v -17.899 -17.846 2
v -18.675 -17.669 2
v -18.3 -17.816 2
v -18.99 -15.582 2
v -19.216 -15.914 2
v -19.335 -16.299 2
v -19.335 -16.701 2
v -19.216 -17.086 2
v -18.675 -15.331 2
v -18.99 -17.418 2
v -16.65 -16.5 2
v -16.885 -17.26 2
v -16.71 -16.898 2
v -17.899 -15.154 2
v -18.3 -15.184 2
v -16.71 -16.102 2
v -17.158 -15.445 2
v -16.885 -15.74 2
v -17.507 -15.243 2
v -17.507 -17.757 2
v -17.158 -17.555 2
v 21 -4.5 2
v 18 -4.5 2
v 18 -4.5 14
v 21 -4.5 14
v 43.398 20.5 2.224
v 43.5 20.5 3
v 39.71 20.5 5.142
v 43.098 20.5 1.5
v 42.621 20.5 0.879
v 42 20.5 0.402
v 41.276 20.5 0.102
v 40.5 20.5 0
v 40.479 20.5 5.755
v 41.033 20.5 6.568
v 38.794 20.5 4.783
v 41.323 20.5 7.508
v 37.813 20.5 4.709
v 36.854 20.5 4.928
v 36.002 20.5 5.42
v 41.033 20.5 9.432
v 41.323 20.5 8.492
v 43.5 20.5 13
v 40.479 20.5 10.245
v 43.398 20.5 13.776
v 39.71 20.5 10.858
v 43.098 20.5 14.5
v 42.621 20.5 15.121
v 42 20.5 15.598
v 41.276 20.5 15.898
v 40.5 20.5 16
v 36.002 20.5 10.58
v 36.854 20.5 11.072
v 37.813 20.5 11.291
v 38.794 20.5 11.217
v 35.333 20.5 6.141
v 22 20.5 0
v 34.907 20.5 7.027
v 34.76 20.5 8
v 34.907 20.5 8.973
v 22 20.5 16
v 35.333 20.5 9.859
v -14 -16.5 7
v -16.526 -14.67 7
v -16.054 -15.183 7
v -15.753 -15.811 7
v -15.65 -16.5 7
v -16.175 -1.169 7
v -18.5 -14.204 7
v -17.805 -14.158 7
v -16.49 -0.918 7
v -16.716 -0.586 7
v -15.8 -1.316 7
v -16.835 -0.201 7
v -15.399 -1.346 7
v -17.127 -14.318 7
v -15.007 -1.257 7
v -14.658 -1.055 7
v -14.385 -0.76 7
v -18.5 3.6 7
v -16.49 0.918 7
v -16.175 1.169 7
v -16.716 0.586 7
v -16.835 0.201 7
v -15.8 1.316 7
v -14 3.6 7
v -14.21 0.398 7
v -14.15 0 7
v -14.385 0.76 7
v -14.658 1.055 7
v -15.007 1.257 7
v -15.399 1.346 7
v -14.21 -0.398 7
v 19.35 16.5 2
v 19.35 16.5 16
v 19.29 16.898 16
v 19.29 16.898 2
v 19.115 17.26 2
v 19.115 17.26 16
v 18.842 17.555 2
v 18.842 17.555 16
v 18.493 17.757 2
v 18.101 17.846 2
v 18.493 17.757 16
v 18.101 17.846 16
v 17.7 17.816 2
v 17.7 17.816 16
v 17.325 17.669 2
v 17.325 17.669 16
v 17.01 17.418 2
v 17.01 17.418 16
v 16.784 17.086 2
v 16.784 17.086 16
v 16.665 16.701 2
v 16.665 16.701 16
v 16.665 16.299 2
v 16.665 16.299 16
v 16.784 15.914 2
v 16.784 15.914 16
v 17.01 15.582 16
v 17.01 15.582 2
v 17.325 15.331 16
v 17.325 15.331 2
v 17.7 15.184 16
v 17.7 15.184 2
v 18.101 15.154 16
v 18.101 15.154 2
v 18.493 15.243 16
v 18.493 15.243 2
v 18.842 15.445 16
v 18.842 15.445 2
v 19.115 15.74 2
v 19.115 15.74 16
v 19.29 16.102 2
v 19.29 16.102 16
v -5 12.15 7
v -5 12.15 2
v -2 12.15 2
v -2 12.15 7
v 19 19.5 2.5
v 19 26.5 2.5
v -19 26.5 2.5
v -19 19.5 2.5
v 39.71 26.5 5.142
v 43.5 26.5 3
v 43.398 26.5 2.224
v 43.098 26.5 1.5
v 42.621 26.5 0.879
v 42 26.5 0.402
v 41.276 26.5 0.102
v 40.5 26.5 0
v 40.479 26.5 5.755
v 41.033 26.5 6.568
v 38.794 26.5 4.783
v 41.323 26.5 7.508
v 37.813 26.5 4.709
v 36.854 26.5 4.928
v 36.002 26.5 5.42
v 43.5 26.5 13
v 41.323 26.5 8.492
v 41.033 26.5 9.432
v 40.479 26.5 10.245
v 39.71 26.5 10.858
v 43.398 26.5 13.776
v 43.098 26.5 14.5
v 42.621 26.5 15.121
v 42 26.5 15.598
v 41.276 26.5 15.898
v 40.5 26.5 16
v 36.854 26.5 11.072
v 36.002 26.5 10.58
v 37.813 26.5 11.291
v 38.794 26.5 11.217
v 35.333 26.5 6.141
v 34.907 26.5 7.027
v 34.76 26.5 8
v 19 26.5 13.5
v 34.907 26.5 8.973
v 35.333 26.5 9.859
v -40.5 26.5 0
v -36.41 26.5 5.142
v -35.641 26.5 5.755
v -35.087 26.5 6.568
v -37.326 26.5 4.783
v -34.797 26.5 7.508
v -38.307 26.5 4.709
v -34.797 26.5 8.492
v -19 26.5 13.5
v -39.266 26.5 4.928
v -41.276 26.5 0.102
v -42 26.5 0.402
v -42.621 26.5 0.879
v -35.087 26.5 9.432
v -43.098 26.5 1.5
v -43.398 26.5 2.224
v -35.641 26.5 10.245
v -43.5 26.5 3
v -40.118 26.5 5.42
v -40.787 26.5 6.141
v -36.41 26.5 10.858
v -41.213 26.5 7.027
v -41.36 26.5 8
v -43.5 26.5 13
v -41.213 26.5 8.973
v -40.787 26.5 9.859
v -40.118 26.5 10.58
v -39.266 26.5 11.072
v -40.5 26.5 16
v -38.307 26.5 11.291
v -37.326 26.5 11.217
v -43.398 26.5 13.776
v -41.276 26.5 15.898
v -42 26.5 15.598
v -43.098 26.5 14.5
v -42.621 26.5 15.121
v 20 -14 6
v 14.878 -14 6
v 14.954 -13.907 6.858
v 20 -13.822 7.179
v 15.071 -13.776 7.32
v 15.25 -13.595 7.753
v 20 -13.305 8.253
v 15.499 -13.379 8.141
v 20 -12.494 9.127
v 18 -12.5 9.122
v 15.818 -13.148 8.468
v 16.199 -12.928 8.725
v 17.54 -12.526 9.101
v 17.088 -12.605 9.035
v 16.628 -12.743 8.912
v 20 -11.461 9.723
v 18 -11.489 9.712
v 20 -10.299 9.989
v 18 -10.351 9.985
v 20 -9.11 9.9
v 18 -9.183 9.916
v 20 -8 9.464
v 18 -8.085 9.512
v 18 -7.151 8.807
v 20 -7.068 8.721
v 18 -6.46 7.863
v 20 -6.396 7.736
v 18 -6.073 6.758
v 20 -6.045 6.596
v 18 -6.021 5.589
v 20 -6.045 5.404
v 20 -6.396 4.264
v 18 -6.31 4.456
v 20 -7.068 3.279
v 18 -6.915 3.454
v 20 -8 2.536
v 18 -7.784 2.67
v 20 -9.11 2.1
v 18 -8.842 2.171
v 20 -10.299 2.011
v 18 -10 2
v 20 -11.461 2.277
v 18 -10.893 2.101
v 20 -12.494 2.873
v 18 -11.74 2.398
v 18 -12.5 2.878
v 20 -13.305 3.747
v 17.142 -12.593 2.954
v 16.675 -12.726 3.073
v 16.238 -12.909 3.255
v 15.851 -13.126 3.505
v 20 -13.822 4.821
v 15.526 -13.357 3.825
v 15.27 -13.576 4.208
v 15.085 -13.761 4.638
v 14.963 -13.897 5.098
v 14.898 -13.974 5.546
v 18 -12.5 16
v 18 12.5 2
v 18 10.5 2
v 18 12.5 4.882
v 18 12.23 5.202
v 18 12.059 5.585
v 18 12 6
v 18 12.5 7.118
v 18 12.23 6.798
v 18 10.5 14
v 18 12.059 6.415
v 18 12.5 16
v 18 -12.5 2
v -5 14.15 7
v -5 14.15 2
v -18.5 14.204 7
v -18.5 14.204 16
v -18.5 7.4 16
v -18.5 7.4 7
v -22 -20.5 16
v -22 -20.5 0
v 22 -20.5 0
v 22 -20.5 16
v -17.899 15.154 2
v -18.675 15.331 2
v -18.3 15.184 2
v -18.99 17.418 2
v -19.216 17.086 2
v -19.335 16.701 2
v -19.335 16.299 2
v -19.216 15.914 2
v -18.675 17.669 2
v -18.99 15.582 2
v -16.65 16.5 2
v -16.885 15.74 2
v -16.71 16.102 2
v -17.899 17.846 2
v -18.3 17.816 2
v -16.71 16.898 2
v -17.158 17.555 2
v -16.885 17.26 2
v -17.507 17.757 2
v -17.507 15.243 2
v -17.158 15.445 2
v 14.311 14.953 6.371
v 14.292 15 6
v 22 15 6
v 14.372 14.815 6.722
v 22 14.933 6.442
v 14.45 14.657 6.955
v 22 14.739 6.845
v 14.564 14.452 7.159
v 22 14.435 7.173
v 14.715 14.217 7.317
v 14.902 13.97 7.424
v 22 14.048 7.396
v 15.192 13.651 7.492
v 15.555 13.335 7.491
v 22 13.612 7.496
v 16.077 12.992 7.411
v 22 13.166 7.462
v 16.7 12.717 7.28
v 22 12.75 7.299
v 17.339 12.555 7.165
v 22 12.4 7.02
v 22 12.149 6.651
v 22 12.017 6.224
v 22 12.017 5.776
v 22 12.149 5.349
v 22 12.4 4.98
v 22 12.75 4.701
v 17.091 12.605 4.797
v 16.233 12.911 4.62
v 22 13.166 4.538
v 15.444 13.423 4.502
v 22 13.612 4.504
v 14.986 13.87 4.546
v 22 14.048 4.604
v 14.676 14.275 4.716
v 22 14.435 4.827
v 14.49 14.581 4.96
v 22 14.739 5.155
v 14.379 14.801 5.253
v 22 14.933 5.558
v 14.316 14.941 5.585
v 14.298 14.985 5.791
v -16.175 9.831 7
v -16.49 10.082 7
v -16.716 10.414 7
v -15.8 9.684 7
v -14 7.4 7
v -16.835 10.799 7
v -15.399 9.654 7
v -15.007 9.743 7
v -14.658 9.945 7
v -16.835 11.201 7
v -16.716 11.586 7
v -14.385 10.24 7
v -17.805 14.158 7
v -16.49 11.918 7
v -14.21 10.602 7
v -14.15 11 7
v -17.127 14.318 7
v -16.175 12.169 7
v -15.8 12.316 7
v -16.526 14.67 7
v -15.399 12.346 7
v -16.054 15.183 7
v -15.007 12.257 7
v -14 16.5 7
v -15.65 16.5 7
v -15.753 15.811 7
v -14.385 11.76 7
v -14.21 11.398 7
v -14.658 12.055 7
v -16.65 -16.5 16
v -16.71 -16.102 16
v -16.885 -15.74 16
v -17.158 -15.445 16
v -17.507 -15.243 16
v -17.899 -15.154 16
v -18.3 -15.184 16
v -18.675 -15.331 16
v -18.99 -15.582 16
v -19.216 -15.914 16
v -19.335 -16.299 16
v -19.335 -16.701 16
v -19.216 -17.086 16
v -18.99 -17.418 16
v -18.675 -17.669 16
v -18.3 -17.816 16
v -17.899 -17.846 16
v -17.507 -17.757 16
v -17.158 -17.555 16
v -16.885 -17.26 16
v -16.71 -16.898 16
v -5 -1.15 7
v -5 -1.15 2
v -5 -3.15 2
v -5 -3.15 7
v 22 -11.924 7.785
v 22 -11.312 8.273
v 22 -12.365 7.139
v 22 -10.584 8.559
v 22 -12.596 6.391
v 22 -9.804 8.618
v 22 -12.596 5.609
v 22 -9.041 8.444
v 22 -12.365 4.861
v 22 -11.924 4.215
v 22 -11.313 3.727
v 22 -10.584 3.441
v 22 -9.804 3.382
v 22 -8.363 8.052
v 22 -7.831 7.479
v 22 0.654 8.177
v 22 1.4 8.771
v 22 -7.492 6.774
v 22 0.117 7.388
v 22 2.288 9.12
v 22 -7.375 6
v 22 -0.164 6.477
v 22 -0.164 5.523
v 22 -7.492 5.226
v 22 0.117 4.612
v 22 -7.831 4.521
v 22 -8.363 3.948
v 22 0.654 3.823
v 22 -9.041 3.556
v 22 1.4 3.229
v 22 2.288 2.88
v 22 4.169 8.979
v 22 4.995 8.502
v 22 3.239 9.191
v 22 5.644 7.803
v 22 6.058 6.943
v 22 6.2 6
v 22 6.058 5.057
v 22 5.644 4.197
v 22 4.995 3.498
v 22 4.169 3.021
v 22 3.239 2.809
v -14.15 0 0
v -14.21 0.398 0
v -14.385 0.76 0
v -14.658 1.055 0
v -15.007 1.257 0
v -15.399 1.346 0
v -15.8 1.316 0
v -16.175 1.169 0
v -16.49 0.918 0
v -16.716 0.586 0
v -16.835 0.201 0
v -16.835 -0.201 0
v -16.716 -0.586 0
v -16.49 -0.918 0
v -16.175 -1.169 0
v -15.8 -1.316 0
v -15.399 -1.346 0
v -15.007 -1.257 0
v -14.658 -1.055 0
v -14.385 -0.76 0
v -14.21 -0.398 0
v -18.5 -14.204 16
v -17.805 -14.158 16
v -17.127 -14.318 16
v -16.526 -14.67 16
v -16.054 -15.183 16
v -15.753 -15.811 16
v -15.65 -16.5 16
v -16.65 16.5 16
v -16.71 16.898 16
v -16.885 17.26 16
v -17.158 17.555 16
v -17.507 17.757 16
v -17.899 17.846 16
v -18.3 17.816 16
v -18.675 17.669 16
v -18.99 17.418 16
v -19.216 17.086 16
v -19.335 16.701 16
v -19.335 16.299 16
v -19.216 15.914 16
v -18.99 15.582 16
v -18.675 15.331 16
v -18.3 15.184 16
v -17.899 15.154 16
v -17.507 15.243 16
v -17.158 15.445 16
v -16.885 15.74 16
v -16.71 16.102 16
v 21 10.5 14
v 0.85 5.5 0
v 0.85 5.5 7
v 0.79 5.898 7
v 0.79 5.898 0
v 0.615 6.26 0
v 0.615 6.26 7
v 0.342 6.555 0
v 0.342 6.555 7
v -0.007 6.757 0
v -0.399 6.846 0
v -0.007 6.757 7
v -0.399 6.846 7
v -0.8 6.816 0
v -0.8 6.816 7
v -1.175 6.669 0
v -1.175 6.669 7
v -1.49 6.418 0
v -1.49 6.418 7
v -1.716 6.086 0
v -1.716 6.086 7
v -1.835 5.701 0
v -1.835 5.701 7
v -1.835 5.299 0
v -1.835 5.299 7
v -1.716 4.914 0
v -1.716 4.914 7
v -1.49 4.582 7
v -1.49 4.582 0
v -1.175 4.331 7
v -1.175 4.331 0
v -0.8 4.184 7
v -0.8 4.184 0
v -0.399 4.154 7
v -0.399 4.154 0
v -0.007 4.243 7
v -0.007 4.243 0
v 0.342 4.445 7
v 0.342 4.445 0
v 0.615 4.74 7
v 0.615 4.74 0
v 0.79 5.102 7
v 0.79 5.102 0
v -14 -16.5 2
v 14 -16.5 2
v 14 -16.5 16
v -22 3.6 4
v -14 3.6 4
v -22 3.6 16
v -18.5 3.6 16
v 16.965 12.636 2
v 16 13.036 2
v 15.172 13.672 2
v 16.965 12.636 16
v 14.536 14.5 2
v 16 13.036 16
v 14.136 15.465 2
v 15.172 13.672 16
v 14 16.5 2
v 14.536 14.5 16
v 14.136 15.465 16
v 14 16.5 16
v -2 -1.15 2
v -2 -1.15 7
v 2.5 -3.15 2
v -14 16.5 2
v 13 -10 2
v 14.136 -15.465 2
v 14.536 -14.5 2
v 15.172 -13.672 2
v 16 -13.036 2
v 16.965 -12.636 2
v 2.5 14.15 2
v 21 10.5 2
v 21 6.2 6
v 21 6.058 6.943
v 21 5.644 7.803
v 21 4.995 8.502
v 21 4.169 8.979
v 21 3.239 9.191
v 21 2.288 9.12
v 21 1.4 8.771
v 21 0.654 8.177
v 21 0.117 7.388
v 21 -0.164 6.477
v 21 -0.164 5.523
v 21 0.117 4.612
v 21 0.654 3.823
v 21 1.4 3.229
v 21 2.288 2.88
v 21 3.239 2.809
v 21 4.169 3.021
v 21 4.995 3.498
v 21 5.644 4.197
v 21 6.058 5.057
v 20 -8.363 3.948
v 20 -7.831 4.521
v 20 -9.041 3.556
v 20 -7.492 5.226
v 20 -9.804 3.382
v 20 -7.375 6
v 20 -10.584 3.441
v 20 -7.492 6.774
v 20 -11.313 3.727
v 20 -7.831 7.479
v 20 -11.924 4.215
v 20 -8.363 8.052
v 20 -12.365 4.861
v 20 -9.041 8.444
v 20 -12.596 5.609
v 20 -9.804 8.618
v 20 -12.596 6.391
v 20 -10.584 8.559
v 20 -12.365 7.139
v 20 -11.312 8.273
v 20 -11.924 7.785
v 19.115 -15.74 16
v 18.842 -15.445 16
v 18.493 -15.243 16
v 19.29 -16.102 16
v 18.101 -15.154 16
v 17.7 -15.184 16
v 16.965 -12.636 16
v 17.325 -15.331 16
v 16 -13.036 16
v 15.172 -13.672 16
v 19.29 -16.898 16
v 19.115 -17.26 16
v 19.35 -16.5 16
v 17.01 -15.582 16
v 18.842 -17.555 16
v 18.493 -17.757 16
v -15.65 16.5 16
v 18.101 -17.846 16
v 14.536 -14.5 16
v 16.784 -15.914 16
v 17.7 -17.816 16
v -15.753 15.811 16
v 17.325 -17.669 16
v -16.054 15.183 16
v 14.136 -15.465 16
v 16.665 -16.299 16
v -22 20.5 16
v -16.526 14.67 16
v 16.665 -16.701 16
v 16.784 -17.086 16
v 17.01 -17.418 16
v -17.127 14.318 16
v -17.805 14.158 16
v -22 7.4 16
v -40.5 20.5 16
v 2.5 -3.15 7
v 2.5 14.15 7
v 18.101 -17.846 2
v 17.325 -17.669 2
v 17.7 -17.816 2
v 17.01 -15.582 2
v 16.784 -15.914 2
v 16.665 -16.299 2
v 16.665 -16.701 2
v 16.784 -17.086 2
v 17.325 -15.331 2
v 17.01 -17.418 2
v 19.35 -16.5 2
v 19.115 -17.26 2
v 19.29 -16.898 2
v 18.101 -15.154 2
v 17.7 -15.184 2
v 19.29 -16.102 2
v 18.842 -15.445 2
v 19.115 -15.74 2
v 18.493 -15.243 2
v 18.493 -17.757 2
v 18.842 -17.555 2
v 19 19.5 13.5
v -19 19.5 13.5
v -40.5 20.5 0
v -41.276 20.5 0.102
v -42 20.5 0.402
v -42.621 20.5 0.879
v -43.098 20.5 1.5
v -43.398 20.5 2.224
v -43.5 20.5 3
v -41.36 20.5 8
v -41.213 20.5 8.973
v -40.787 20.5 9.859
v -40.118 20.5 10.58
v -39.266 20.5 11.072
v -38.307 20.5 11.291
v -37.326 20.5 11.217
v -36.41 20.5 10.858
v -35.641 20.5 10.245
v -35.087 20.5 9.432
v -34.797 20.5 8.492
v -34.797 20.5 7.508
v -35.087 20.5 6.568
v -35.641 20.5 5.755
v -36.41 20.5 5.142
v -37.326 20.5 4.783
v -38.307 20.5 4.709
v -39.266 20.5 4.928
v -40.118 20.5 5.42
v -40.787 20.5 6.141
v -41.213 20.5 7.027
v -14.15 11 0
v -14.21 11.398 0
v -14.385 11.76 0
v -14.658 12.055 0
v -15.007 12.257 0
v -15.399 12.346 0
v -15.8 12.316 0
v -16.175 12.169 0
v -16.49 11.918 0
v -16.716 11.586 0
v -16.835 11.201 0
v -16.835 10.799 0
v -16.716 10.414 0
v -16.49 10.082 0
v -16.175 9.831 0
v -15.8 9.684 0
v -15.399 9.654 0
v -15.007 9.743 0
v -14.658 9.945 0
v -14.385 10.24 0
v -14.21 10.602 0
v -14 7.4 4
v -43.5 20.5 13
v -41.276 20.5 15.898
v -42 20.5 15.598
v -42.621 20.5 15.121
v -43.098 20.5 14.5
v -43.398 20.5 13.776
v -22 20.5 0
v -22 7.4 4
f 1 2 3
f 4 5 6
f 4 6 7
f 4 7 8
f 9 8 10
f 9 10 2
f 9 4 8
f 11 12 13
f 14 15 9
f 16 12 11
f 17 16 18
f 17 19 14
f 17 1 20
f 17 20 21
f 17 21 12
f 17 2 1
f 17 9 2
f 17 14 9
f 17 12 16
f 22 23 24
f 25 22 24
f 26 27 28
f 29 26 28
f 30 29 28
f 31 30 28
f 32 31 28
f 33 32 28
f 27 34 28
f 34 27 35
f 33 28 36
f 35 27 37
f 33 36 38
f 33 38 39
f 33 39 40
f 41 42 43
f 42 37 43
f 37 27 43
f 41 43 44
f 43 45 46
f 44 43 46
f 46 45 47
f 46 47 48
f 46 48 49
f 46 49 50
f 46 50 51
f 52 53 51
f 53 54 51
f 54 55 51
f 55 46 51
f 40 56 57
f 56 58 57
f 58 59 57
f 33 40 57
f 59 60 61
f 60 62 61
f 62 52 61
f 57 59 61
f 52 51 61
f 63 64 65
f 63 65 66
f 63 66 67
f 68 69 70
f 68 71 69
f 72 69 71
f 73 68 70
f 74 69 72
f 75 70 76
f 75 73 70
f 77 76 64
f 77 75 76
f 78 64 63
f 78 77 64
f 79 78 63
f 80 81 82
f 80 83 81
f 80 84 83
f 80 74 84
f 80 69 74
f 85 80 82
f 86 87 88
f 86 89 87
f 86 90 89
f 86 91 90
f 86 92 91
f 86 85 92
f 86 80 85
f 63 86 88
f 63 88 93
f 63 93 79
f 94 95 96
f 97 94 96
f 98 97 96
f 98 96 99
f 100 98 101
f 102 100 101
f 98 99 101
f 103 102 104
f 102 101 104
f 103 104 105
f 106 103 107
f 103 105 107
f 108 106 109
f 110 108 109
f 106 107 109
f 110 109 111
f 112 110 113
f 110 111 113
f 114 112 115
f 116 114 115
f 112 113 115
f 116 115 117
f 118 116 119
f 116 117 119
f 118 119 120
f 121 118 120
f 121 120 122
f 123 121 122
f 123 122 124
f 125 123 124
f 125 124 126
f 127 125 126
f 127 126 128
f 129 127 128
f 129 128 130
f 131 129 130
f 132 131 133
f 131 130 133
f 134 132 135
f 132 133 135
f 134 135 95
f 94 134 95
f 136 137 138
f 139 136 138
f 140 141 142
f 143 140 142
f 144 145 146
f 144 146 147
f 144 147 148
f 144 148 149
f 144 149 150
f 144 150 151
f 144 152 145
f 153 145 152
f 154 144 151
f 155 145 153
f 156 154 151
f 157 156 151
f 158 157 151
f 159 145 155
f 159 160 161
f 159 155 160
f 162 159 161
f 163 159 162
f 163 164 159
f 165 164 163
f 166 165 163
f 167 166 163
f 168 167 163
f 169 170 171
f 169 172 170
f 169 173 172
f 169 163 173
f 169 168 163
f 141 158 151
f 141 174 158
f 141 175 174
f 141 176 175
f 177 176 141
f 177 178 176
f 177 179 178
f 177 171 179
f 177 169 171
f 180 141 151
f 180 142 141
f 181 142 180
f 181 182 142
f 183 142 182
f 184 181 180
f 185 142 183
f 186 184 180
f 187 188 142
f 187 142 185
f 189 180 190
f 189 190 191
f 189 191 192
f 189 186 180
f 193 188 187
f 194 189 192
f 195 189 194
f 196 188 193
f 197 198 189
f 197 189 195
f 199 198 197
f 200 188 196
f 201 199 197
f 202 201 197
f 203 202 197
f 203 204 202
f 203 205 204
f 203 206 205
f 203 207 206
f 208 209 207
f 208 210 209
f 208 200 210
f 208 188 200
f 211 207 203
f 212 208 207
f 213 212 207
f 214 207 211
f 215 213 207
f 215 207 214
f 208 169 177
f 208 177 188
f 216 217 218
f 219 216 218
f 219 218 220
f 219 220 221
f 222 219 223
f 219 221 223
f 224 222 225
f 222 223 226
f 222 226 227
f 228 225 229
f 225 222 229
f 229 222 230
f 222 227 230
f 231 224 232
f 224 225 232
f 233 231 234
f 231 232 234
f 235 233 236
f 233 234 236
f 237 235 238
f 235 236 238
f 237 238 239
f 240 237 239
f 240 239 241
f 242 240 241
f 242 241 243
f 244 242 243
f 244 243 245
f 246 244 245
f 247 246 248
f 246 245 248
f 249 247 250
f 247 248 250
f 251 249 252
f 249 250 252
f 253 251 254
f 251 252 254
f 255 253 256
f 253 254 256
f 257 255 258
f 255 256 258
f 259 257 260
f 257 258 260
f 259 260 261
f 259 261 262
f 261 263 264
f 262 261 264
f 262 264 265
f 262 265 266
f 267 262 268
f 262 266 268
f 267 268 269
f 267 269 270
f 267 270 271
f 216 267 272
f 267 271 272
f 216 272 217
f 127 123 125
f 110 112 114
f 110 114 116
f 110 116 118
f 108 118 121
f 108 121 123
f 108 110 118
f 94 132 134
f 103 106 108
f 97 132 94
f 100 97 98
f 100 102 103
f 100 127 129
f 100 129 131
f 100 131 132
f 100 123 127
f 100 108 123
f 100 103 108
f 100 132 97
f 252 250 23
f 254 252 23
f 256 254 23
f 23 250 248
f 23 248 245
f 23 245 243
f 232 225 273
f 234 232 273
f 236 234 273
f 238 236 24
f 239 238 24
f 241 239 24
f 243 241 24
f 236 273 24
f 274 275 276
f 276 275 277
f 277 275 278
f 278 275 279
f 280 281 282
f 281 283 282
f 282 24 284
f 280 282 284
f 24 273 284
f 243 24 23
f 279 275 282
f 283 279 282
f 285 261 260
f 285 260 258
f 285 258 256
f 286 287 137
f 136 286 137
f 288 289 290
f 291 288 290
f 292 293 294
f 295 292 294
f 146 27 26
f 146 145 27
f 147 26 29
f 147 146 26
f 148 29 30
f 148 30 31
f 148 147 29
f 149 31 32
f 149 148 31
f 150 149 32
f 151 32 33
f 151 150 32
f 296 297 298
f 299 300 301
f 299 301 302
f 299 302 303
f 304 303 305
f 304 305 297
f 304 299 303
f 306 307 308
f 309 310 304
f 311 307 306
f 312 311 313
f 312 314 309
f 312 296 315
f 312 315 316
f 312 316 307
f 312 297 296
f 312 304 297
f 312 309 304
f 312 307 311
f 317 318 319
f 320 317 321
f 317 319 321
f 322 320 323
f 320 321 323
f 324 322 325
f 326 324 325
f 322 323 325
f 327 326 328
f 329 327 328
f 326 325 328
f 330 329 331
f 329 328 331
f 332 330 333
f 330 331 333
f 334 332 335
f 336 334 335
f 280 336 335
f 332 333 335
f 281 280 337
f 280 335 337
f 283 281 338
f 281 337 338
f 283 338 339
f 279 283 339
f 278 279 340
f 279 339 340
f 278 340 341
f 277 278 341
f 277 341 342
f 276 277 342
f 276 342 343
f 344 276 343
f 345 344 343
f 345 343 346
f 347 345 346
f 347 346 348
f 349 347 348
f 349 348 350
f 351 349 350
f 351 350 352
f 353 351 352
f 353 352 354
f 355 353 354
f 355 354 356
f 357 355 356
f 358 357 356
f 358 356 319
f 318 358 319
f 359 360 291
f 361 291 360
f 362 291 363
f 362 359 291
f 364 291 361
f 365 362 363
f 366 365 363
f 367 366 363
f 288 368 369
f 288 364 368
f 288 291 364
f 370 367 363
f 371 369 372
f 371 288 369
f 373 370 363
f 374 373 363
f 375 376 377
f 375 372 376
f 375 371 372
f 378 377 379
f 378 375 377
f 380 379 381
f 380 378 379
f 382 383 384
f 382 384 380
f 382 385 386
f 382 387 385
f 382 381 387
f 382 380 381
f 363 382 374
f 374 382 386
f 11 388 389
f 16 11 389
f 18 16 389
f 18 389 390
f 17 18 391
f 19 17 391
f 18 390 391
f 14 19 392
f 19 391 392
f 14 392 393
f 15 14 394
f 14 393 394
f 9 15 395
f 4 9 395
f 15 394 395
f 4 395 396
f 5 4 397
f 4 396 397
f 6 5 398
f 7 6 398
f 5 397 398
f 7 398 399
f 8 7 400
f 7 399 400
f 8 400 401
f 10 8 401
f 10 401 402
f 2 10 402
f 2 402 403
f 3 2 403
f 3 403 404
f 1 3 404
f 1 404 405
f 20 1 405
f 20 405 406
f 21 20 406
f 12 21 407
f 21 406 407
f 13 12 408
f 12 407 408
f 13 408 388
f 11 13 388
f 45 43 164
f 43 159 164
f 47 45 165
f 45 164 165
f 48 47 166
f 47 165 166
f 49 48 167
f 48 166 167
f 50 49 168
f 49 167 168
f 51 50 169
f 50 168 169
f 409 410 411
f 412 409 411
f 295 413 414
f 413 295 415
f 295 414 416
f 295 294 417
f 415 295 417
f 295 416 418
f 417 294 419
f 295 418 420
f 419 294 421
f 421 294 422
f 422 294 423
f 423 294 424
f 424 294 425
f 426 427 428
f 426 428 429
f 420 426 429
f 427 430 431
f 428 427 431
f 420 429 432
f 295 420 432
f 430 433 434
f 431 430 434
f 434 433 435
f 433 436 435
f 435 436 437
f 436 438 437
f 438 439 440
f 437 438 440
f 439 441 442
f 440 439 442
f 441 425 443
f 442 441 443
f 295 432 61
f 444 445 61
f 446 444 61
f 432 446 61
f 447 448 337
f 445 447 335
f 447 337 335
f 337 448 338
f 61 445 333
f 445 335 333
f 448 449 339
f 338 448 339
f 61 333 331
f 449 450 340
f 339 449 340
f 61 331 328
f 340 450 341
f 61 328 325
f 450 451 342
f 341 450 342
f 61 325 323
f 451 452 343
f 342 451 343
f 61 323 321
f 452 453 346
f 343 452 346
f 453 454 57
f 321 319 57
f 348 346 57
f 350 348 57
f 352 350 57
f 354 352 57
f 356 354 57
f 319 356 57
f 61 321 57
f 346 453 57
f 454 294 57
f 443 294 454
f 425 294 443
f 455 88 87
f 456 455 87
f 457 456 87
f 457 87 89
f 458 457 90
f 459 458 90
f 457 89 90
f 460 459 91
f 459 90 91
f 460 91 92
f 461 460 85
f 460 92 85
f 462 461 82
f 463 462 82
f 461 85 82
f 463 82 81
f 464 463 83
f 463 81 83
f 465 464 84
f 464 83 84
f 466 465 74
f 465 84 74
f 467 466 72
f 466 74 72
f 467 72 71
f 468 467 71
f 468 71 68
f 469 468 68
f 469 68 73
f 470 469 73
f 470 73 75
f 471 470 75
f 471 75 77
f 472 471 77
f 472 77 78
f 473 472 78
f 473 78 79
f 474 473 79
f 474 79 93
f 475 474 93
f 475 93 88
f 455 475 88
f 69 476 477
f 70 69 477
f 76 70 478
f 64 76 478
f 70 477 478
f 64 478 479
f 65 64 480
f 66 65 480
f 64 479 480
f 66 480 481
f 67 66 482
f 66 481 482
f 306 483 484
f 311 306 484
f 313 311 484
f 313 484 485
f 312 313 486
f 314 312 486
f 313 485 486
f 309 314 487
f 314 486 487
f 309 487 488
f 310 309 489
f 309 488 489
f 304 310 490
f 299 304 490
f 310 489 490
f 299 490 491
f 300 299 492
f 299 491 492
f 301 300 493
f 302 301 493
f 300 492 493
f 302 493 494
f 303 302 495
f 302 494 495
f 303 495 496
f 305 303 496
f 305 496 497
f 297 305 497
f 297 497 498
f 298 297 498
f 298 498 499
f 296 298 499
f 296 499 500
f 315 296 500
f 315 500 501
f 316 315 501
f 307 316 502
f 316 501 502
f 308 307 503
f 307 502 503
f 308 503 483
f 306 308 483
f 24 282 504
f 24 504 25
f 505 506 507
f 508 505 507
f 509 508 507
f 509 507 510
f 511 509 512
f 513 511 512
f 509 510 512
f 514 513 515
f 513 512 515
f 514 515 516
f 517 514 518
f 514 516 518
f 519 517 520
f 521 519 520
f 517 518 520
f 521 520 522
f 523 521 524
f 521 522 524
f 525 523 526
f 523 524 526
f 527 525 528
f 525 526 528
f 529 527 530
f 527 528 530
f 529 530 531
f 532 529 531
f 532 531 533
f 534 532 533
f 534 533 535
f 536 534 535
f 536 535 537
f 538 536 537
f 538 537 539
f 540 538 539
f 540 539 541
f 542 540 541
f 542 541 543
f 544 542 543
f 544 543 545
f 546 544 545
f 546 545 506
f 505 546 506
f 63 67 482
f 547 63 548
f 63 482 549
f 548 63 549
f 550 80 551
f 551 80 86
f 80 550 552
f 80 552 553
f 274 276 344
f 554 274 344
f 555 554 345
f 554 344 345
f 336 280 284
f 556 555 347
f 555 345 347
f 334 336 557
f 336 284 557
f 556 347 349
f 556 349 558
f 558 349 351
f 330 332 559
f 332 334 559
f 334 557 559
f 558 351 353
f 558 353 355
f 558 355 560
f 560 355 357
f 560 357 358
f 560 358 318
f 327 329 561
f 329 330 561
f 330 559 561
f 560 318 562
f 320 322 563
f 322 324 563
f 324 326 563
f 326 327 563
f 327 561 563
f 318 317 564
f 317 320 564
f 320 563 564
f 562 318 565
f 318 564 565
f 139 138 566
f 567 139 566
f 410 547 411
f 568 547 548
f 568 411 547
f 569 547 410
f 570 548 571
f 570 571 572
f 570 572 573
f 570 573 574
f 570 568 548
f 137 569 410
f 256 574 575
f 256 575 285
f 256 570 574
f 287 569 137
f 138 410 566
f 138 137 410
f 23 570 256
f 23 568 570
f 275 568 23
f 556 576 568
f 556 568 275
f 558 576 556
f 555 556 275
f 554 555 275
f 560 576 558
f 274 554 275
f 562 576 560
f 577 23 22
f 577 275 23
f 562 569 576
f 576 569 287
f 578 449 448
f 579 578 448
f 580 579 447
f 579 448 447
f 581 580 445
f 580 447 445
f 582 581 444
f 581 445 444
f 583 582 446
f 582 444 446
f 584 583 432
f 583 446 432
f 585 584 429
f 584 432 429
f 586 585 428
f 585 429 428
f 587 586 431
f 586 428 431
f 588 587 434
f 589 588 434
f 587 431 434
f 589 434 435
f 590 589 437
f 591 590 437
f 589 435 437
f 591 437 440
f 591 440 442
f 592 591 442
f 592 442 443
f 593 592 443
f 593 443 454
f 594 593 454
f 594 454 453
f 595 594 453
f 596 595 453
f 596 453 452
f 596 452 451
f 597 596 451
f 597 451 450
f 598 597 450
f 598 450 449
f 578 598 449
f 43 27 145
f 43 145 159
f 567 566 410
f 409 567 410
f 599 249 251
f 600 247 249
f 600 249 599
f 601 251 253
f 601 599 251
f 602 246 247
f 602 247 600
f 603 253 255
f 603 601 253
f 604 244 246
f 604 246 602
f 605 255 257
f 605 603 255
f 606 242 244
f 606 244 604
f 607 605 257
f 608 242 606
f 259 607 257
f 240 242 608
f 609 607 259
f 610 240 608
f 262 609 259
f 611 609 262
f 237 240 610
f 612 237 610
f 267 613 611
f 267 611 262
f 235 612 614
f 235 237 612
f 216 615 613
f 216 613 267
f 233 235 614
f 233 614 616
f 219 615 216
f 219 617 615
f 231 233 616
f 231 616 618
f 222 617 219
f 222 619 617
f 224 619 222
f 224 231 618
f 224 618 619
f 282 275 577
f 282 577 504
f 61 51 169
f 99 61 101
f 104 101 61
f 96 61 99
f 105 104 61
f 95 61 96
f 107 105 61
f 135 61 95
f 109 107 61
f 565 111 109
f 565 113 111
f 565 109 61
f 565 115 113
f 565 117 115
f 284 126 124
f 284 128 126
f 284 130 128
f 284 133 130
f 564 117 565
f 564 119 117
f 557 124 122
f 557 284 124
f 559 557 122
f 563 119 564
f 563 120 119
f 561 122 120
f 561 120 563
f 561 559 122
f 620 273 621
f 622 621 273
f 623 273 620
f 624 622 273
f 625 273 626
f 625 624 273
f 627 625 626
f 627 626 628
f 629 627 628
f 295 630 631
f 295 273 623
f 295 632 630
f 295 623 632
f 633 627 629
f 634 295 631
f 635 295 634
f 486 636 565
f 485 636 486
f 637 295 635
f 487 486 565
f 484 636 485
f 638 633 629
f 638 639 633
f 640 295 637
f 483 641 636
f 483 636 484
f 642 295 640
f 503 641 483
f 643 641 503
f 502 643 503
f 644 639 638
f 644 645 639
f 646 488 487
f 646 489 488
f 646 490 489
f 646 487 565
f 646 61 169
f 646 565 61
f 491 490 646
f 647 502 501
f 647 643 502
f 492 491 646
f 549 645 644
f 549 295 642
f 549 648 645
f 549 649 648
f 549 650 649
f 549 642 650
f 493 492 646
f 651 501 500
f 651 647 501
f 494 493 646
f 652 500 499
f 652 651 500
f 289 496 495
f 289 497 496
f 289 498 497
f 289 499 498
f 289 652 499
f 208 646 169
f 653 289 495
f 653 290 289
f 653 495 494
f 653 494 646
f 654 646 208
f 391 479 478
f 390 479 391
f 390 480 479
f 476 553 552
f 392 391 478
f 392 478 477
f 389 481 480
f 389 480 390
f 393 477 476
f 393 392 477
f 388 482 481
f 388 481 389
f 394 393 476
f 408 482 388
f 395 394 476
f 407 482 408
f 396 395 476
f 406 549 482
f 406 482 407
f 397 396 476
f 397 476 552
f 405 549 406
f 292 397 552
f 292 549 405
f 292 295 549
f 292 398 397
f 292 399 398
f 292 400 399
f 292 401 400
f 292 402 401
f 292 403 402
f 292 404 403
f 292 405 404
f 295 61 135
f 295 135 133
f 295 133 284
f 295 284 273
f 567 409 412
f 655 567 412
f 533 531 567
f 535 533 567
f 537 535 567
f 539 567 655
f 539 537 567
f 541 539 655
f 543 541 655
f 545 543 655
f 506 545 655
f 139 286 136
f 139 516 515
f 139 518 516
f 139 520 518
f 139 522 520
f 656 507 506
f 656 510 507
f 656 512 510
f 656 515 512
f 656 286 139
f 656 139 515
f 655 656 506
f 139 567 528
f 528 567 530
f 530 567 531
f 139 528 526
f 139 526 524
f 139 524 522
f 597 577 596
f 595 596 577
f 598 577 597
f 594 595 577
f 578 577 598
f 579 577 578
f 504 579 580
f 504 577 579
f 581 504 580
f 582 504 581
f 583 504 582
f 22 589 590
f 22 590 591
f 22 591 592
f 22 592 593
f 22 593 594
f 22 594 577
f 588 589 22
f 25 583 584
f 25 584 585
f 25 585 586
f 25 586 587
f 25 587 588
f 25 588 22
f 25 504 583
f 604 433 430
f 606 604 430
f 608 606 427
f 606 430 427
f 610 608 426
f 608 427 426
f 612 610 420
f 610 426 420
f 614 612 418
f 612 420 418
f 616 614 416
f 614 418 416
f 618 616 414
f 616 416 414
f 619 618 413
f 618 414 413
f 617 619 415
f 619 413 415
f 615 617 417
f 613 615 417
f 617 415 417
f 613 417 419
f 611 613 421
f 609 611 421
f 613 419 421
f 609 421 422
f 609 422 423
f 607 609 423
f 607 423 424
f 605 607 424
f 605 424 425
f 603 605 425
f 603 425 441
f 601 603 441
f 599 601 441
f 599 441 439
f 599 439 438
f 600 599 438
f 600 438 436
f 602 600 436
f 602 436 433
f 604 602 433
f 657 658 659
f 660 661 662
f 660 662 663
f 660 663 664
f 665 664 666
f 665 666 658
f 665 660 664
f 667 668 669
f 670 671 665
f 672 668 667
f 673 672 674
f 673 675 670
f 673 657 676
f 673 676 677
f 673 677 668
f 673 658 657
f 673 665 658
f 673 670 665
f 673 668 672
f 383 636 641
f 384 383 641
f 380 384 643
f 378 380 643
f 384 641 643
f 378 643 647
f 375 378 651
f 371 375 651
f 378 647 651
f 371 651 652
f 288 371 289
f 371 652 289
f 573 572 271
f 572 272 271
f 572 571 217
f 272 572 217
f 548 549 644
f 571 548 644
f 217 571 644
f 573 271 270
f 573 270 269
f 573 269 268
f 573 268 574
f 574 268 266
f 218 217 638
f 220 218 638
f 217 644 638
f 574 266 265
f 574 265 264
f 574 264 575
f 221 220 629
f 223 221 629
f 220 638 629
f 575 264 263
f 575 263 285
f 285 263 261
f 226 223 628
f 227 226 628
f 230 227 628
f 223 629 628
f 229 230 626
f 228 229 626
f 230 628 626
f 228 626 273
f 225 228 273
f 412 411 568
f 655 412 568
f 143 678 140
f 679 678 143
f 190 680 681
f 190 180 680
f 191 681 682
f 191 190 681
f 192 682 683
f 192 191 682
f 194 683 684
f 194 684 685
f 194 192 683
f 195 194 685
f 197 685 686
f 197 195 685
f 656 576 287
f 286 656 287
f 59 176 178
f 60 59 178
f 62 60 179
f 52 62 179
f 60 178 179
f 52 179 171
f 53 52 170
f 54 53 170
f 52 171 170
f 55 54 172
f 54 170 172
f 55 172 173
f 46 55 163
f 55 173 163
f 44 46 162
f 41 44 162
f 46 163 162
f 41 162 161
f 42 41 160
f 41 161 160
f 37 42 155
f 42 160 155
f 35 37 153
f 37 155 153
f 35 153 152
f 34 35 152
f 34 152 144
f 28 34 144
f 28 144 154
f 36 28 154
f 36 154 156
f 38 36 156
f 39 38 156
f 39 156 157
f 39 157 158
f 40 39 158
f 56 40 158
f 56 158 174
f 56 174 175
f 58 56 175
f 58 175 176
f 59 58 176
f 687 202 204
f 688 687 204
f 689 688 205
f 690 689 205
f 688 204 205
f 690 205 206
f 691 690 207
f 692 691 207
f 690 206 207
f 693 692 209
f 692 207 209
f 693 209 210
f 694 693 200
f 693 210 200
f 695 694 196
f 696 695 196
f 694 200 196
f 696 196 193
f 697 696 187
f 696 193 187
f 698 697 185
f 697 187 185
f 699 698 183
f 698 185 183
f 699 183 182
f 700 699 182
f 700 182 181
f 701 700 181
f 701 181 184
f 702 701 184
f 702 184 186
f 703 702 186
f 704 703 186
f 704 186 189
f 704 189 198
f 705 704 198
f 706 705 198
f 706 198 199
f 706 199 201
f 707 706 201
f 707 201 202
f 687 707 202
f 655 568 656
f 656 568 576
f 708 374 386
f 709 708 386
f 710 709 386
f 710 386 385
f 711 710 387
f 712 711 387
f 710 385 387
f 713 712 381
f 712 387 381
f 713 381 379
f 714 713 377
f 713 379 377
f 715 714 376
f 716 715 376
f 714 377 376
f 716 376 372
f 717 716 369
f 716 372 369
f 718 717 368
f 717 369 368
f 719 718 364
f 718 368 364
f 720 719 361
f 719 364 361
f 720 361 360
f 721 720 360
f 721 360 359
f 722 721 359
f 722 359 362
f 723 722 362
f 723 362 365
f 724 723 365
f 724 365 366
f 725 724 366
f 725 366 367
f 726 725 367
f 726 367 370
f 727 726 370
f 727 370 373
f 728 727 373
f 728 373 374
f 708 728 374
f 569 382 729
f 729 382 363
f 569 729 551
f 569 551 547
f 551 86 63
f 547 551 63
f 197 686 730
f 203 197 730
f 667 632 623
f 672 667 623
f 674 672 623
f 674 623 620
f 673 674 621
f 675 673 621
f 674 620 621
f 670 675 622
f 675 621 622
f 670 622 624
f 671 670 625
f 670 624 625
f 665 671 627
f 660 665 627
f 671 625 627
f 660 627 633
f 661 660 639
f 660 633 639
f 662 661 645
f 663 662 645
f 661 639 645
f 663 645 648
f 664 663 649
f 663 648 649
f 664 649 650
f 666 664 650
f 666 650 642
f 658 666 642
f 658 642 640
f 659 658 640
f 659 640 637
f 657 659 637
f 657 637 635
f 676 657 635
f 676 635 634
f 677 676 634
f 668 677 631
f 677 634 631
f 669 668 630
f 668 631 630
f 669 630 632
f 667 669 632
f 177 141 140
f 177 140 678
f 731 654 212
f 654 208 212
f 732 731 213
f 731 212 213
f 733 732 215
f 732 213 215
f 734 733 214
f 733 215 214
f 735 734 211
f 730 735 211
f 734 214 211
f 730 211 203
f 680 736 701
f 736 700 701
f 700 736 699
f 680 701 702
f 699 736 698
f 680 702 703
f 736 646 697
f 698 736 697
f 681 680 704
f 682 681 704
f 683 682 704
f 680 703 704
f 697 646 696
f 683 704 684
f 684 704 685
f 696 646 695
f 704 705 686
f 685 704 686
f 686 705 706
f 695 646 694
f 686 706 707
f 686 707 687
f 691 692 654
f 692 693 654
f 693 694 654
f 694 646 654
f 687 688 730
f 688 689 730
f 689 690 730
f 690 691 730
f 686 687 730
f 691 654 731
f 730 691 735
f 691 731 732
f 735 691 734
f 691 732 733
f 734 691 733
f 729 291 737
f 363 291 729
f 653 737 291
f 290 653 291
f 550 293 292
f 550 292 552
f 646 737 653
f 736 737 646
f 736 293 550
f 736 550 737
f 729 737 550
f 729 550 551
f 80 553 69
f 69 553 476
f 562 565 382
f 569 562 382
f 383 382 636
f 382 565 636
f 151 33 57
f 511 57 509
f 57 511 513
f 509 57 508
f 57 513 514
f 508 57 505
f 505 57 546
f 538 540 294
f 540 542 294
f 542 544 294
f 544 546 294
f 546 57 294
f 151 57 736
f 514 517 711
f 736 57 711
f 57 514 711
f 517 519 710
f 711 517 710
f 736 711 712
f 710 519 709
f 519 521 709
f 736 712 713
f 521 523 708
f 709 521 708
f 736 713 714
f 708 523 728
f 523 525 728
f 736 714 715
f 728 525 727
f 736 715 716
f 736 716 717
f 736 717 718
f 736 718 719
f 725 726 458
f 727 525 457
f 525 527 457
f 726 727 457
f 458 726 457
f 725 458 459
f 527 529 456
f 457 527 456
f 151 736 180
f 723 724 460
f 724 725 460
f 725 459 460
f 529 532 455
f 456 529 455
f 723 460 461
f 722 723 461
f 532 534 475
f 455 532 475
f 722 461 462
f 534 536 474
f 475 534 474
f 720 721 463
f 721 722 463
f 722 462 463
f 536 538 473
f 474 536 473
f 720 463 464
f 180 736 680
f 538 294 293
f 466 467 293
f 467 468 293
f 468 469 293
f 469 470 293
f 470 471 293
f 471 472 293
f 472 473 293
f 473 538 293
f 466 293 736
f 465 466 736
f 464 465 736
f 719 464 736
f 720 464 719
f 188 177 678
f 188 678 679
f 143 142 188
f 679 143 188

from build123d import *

# Parameters (mm, degrees)
F0_W      = 44
F0_H      = 41
F1_DEPTH  = 16
F2_R      = 1.35
F3_DEPTH  = 14
F6_DEPTH  = 9
F7_DEPTH  = 7
F8_R      = 1.35
F9_DEPTH  = 7.001
F11_R     = 3.2
F11_R_2   = 1.5
F11_R_3   = 2.625
F12_DEPTH = 10
F13_W     = 8
F13_H     = 3.8
F14_DEPTH = 12
F15_W     = 87
F15_H     = 16
F16_DEPTH = 6
F17_R     = 3.3
F18_DEPTH = 47.001
F19_R     = 3
F20_W     = 15
F20_H     = 12
F21_DEPTH = 3
F22_W     = 38
F22_H     = 11
F23_DEPTH = 7
F25_R     = 4
F26_DEPTH = 7


with BuildPart() as f1:
    # F0 (on Top) → F1 (new body)
    with BuildSketch(Plane.XY):
        Rectangle(F0_W, F0_H)
    extrude(amount=F1_DEPTH)

    # F2 (on face) → F3 (cut)
    with BuildSketch(Plane.XY.offset(16)):
        with BuildLine():
            Line((14, 16.5), (-14, 16.5))
            Line((-14, 16.5), (-14, -16.5))
            Line((-14, -16.5), (14, -16.5))
            ThreePointArc((14, -16.5), (15.1715728753, -13.6715728753), (18, -12.5))
            Line((18, -12.5), (18, 12.5))
            ThreePointArc((18, 12.5), (15.1715728753, 13.6715728753), (14, 16.5))
        make_face()
        with Locations((-18, 16.5)):
            Circle(F2_R)
        with Locations((18, 16.5)):
            Circle(F2_R)
        with Locations((-18, -16.5)):
            Circle(F2_R)
        with Locations((18, -16.5)):
            Circle(F2_R)
    extrude(amount=-F3_DEPTH, mode=Mode.SUBTRACT)

    # F5 (on face) → F6 (cut)
    with BuildSketch(Plane.XY.offset(16)):
        with BuildLine():
            ThreePointArc((-15.65, 16.5), (-16.5256357302, 14.6700409841), (-18.5, 14.2038074994))
            Line((-18.5, 14.2038074994), (-18.5, -14.2038074994))
            ThreePointArc((-18.5, -14.2038074994), (-16.5256357302, -14.6700409841), (-15.65, -16.5))
            Line((-15.65, -16.5), (-14, -16.5))
            Line((-14, -16.5), (-14, 16.5))
            Line((-14, 16.5), (-15.65, 16.5))
        make_face()
    extrude(amount=-F6_DEPTH, mode=Mode.SUBTRACT)

    # F4 (on Top) → F7 (join)
    with BuildSketch(Plane.XY):
        Polygon((-5, -1.15), (-5, -3.15), (2.5, -3.15), (2.5, 14.15), (-5, 14.15), (-5, 12.15), (-2, 12.15), (-2, -1.15), align=None)
    extrude(amount=F7_DEPTH)

    # F8 (on face) → F9 (cut, through all)
    with BuildSketch(Plane.XY.offset(7)):
        with Locations((-0.5, 5.5)):
            Circle(F8_R)
        with Locations((-15.5, 11)):
            Circle(F8_R)
        with Locations((-15.5, 0)):
            Circle(F8_R)
    extrude(amount=-F9_DEPTH, mode=Mode.SUBTRACT)

    # F11 (on face) → F12 (cut)
    with BuildSketch(Plane.YZ.offset(22)):
        with Locations((3, 6)):
            Circle(F11_R)
        with Locations((13.5, 6)):
            Circle(F11_R_2)
        with Locations((-10, 6)):
            Circle(F11_R_3)
    extrude(amount=-F12_DEPTH, mode=Mode.SUBTRACT)

    # F13 (on face) → F14 (cut)
    with BuildSketch(Plane.XY.offset(16)):
        with Locations((-18, 5.5)):
            Rectangle(F13_W, F13_H)
    extrude(amount=-F14_DEPTH, mode=Mode.SUBTRACT)

    # F15 (on face) → F16 (join)
    with BuildSketch(Plane(origin=(0, 20.5, 0), x_dir=(-1, 0, 0), z_dir=(0, 1, 0))):
        with Locations((0, 8)):
            Rectangle(F15_W, F15_H)
    extrude(amount=F16_DEPTH)

    # F17 (on face) → F18 (cut, through all)
    with BuildSketch(Plane(origin=(0, 26.5, 0), x_dir=(-1, 0, 0), z_dir=(0, 1, 0))):
        with Locations((38.06, 8)):
            Circle(F17_R)
        with Locations((-38.06, 8)):
            Circle(F17_R)
    extrude(amount=-F18_DEPTH, mode=Mode.SUBTRACT)

    # F19
    f19_edges = [f1.edges().sort_by_distance(p)[0] for p in [
        (43.5, 23.5, 16),
        (43.5, 23.5, 0),
        (-43.5, 23.5, 0),
        (-43.5, 23.5, 16),
    ]]
    fillet(f19_edges, radius=F19_R)

    # F20 (on face) → F21 (cut)
    with BuildSketch(Plane(origin=(18, 0, 0), x_dir=(0, -1, 0), z_dir=(-1, 0, 0))):
        with Locations((-3, 8)):
            Rectangle(F20_W, F20_H)
    extrude(amount=-F21_DEPTH, mode=Mode.SUBTRACT)

    # F22 (on face) → F23 (cut)
    with BuildSketch(Plane(origin=(0, 26.5, 0), x_dir=(-1, 0, 0), z_dir=(0, 1, 0))):
        with Locations((0, 8)):
            Rectangle(F22_W, F22_H)
    extrude(amount=-F23_DEPTH, mode=Mode.SUBTRACT)

    # F25 (on offset) → F26 (cut)
    with BuildSketch(Plane(origin=(13, 0, 0), x_dir=(0, -1, 0), z_dir=(-1, 0, 0))):
        with Locations((10, 6)):
            Circle(F25_R)
    extrude(amount=-F26_DEPTH, mode=Mode.SUBTRACT)


solid = f1.part
